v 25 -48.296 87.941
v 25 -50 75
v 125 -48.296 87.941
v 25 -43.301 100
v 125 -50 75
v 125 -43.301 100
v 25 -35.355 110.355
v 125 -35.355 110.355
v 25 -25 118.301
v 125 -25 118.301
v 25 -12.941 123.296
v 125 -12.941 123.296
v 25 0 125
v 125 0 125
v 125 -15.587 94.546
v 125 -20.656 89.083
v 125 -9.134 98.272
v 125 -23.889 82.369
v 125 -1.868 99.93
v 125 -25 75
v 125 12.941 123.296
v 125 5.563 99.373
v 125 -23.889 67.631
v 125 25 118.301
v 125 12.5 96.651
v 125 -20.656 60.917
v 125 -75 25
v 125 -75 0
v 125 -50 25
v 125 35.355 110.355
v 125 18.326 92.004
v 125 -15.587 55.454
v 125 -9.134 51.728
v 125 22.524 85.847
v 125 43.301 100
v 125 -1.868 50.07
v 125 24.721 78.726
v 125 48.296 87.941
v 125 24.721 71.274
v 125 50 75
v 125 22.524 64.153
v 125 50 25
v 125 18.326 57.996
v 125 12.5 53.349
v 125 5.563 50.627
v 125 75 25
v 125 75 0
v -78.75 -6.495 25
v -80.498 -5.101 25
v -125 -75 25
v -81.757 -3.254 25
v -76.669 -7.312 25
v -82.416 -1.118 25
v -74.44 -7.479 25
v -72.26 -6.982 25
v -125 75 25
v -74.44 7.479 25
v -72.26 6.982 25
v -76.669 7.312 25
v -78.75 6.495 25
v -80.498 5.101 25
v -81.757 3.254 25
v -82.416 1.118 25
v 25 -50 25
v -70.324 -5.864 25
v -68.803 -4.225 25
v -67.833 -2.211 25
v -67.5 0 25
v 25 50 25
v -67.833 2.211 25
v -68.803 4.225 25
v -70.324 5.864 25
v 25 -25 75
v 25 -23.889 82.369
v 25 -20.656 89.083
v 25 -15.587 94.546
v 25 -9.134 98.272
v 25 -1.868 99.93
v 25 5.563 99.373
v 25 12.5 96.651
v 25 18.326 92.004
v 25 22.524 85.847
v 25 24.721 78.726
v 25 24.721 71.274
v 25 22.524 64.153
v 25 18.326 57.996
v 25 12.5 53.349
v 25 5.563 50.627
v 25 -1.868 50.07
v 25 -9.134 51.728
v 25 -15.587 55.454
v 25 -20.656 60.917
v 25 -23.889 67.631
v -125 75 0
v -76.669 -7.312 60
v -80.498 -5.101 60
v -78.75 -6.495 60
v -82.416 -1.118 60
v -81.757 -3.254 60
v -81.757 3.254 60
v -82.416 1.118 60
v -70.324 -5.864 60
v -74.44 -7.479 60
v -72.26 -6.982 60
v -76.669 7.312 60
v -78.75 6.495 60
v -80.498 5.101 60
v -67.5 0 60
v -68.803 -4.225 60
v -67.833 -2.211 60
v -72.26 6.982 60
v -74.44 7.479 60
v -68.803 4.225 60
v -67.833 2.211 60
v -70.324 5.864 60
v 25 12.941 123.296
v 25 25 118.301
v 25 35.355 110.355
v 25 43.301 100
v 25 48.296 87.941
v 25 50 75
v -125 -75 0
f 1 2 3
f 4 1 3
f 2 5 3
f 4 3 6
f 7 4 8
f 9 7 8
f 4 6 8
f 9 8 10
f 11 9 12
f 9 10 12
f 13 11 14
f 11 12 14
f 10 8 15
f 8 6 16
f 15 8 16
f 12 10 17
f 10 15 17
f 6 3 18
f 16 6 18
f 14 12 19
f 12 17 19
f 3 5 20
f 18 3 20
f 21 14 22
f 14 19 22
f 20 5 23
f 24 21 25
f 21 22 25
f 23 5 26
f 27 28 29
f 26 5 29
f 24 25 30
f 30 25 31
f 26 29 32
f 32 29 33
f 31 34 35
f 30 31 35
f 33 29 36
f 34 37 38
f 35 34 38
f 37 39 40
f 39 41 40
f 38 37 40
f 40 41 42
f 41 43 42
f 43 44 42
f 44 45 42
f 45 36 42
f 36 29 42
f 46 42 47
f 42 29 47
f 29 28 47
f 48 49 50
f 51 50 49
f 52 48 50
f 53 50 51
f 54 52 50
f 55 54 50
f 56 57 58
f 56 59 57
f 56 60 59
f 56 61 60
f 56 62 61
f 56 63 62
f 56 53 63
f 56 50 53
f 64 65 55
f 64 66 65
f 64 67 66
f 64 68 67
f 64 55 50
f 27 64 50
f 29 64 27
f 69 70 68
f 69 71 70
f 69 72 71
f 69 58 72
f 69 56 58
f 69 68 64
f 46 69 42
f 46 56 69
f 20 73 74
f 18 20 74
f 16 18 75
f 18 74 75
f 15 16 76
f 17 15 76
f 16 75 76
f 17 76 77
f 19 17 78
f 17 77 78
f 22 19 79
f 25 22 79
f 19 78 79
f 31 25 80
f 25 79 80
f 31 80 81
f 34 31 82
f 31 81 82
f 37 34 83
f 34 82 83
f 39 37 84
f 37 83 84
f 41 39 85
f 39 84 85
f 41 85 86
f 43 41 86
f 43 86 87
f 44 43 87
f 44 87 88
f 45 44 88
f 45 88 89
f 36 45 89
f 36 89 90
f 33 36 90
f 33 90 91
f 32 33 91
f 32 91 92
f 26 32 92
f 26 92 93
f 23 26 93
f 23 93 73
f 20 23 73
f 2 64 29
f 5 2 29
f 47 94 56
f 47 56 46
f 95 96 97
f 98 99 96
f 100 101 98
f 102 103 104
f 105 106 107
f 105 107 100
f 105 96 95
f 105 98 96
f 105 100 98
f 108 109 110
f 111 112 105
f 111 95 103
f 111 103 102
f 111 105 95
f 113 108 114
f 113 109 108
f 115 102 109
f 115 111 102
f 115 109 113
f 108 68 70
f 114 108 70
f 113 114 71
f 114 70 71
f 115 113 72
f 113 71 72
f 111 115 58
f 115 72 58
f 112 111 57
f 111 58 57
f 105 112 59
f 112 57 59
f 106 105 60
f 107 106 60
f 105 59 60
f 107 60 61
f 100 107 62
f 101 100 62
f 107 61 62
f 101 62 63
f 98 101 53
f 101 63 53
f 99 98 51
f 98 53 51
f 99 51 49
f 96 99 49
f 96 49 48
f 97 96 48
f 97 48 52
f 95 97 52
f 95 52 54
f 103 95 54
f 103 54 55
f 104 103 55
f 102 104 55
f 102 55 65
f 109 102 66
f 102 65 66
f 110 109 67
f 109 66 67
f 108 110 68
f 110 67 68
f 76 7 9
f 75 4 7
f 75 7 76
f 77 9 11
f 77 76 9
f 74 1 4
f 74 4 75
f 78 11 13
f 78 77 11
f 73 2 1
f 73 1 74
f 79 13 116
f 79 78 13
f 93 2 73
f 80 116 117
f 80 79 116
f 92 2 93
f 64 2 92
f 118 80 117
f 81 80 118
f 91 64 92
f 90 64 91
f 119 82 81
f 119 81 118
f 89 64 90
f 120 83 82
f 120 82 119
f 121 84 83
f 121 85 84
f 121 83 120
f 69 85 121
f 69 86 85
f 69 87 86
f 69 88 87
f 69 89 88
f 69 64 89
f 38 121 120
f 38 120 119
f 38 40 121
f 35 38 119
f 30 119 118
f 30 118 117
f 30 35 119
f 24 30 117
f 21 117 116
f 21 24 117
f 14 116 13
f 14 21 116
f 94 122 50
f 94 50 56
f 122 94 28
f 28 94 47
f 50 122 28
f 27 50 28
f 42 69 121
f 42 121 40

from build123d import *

# Parameters (mm, degrees)
F0_W     = 250
F0_H     = 150
F7_DEPTH = 25
F1_R     = 7.5
F2_DEPTH = 35
F3_W     = 100
F3_H     = 100
F4_DEPTH = 100
F5_R     = 25
F8_DEPTH = 100.001
F6_R     = 49.99999


# Not quite as in the source:
# - a fillet or chamfer is up to 0.001 mm smaller than in the source, because OpenCascade refuses the exact size


with BuildPart() as f7:
    # F0 (on Top) → F7 (new body)
    with BuildSketch(Plane.XY):
        Rectangle(F0_W, F0_H)
    extrude(amount=F7_DEPTH)

    # F1 (on face) → F2 (join)
    with BuildSketch(Plane.XY.offset(25)):
        with Locations((-75, 0)):
            Circle(F1_R)
    extrude(amount=F2_DEPTH)

    # F3 (on face) → F4 (join)
    with BuildSketch(Plane.XY.offset(25)):
        with Locations((75, 0)):
            Rectangle(F3_W, F3_H)
    extrude(amount=F4_DEPTH)

    # F5 (on face) → F8 (cut, through all)
    with BuildSketch(Plane(origin=(25, 0, 0), x_dir=(0, -1, 0), z_dir=(-1, 0, 0))):
        with Locations((0, 75)):
            Circle(F5_R)
    extrude(amount=-F8_DEPTH, mode=Mode.SUBTRACT)

    # F6 (radius 50 in the source; OpenCascade refuses exactly that, so slightly less here)
    f6_edges = [f7.edges().sort_by_distance(p)[0] for p in [
        (75, 50, 125),
        (75, -50, 125),
    ]]
    fillet(f6_edges, radius=F6_R)


solid = f7.part
